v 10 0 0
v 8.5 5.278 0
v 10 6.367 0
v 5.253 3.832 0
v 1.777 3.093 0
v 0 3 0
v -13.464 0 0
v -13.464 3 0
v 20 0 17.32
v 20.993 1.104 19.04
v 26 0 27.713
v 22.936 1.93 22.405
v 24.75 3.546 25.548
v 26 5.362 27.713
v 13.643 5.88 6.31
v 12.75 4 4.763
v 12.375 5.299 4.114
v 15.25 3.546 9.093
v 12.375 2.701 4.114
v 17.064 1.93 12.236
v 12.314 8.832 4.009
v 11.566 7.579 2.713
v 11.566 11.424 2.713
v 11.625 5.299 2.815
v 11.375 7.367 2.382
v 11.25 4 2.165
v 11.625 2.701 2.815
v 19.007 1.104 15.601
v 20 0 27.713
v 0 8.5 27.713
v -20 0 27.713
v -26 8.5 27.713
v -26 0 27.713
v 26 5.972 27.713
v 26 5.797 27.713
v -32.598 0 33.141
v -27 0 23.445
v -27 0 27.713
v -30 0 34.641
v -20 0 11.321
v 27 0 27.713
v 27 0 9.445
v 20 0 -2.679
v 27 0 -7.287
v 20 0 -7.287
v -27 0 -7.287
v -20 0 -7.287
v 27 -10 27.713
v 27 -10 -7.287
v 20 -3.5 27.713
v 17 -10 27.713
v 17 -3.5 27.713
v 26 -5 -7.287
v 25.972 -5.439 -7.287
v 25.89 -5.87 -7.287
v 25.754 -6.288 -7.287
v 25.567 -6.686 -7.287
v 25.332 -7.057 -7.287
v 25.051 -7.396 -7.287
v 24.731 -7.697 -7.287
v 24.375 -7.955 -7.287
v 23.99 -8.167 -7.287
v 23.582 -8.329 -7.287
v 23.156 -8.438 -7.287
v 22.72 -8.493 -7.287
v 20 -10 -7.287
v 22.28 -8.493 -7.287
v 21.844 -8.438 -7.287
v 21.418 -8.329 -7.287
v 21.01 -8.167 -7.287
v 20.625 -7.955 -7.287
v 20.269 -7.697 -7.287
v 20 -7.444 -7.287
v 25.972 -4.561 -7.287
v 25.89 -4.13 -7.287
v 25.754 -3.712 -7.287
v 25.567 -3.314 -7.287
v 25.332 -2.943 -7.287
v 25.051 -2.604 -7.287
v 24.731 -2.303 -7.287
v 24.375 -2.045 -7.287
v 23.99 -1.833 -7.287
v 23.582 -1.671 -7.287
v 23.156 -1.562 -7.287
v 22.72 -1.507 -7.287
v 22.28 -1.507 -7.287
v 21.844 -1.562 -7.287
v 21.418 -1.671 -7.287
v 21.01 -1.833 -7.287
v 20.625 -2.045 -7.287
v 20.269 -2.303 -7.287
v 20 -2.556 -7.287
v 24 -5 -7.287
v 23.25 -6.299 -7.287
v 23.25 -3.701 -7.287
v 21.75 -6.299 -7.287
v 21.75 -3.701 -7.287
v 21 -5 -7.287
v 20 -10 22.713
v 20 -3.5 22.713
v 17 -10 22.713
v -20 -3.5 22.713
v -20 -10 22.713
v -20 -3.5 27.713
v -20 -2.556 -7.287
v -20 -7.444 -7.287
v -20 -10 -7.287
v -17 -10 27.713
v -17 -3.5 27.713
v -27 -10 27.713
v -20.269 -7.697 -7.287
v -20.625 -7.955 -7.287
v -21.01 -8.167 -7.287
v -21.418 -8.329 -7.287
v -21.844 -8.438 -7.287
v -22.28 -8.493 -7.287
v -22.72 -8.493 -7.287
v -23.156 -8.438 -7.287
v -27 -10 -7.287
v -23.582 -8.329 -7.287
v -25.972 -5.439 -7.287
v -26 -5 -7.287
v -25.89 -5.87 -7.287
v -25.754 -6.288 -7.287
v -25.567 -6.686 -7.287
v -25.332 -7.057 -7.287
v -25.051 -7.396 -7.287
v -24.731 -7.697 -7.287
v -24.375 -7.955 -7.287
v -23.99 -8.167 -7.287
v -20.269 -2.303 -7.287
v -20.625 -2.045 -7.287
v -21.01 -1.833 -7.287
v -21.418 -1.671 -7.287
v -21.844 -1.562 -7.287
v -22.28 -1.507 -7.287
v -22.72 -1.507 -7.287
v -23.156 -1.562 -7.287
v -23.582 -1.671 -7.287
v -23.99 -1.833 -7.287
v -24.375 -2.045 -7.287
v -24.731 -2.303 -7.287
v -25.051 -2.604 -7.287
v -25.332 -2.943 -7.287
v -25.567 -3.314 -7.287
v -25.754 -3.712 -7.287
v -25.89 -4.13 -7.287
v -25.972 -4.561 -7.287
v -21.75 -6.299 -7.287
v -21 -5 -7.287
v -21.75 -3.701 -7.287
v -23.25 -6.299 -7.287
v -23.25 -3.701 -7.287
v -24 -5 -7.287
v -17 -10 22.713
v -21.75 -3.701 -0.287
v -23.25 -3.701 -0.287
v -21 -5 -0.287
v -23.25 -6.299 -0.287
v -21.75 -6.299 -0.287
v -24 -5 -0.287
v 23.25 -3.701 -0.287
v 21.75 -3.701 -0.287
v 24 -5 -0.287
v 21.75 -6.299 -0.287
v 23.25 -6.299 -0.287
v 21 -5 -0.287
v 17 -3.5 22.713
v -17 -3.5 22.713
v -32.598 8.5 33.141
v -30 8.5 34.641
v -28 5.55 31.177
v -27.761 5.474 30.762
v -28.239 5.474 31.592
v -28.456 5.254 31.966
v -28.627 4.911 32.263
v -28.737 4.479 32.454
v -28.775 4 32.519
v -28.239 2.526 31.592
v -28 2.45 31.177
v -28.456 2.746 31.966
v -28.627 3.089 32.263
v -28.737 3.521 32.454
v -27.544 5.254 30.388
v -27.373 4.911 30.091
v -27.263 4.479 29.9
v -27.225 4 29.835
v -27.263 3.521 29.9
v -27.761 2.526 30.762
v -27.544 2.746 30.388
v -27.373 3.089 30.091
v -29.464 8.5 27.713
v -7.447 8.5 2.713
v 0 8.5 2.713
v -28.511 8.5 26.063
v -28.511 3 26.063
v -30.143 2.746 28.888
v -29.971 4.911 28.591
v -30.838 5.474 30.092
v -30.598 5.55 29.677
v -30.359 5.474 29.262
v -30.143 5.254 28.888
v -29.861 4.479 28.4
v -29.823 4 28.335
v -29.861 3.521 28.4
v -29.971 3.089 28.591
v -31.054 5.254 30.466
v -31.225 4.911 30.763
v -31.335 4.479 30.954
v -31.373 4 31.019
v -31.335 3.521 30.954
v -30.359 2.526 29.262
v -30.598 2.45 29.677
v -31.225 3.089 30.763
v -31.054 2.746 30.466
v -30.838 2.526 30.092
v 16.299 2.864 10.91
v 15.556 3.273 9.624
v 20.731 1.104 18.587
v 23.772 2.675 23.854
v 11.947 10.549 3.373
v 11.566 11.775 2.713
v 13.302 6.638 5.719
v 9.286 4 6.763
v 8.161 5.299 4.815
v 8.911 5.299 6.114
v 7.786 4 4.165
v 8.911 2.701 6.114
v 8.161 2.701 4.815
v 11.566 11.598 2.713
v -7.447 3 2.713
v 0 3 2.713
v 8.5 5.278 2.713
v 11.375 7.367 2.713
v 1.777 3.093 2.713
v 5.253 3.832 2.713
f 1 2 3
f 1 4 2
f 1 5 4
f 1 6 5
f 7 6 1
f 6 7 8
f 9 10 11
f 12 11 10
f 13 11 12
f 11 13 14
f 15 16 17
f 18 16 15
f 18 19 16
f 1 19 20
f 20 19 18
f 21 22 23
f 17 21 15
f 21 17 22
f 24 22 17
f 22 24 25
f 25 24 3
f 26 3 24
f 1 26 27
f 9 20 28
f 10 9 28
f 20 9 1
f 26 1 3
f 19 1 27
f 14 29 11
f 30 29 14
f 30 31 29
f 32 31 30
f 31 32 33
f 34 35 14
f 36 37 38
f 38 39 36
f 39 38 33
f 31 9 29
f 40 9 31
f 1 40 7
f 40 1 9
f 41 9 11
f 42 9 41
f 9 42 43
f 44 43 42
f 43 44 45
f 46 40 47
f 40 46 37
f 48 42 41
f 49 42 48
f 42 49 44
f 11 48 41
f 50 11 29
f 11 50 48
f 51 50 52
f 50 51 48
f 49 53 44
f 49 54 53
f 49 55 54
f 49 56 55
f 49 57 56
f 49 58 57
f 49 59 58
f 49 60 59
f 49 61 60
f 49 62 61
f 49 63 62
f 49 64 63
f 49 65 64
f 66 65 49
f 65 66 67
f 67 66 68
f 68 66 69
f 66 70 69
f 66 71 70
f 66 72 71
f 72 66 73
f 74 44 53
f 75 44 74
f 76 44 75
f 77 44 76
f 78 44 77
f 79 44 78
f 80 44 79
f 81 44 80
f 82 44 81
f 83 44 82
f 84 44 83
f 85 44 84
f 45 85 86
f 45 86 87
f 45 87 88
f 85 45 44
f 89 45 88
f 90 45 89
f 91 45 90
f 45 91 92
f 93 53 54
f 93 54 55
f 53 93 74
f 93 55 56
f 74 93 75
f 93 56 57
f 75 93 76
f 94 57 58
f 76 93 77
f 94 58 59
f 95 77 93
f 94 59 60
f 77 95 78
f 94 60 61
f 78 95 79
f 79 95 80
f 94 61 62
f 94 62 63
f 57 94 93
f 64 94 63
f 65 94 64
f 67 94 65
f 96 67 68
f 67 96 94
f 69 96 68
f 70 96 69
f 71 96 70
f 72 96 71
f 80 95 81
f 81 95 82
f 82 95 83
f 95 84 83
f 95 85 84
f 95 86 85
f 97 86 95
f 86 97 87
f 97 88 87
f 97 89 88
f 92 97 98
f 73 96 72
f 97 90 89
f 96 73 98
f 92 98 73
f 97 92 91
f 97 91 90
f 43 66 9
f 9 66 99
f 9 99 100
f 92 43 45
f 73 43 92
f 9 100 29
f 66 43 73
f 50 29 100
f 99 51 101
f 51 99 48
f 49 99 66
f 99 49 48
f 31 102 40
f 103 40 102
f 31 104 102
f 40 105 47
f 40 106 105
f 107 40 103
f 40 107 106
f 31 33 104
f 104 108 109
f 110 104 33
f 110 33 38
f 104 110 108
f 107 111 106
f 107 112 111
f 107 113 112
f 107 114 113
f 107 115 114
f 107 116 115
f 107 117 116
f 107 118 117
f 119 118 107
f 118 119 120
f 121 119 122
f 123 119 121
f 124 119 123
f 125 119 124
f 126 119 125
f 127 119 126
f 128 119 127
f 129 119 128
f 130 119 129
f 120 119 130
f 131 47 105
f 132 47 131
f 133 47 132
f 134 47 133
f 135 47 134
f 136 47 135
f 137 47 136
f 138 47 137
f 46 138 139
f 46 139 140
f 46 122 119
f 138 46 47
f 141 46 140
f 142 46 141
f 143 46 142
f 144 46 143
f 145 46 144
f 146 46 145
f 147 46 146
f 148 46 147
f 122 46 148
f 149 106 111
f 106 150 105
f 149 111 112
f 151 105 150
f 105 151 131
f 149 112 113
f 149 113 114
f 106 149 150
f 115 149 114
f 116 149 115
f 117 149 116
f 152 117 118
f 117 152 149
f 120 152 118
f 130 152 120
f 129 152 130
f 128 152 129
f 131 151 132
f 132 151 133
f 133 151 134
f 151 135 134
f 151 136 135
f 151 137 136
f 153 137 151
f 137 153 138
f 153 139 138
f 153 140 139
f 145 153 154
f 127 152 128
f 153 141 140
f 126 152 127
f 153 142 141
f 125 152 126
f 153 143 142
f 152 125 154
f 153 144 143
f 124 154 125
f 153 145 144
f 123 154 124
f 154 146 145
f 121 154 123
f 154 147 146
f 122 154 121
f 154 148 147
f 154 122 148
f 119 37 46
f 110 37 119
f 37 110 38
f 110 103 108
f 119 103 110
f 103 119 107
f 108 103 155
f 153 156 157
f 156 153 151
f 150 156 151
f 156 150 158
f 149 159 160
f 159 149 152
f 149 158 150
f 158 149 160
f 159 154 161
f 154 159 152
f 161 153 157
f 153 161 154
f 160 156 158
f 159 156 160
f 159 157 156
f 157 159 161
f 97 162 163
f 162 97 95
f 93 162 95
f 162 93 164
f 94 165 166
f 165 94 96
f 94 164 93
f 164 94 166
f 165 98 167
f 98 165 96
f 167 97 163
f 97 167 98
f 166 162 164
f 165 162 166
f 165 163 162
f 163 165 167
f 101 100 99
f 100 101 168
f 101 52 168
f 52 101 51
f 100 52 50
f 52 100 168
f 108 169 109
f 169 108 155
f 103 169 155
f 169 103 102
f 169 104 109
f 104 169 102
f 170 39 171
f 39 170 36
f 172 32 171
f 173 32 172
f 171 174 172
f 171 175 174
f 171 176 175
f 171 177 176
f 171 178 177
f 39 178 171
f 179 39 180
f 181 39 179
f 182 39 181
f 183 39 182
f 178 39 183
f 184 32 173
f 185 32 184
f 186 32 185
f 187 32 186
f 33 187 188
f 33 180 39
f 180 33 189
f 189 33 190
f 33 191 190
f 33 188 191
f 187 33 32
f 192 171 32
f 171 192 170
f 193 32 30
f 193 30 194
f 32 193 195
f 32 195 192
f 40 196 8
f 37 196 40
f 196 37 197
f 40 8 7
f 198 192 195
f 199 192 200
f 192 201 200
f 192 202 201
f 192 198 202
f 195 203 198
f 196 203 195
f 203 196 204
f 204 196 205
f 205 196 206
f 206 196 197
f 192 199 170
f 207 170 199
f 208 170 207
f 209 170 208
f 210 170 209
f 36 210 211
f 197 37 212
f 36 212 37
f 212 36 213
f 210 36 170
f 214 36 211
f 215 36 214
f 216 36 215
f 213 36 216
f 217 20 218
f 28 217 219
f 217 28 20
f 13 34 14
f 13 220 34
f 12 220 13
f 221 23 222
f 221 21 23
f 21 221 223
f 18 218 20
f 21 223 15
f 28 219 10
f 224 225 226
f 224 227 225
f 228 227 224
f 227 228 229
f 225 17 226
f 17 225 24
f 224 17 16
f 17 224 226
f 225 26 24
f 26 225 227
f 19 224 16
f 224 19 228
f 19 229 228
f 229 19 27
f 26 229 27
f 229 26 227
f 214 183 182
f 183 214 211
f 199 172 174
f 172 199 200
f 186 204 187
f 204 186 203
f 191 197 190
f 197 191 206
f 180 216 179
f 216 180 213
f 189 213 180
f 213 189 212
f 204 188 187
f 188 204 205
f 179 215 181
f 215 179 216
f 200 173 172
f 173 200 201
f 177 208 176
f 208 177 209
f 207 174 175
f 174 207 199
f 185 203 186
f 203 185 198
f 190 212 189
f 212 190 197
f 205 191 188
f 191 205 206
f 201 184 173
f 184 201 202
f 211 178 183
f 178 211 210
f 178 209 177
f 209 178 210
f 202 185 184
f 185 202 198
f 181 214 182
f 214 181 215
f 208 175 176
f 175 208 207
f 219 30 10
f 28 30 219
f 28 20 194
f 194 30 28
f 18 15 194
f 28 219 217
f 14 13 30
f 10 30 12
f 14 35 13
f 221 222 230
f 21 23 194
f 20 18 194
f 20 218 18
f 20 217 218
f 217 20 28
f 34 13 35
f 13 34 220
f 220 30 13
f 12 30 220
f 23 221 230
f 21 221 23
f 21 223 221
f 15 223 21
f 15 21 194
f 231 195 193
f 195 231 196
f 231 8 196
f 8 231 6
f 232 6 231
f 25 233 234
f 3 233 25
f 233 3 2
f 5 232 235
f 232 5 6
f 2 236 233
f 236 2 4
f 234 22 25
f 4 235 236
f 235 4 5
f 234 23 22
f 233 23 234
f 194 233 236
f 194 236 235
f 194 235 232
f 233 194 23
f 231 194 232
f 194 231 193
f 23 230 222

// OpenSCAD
fan_degree = 30;
fan_size = 40;
cube_x = 60;
cube_y = 40;

nozzle_height = 6; //3-1;
screw_y_offset = 5.0;

m_c = 9-1;
m_beta = fan_degree;
m_alpha=180-90-m_beta;
m_a = cos(m_beta)*m_c;
m_b = sin(m_beta)*m_c;

a();
//a(false);
//b();

module b() {
    translate([0, 0, -(40-(cos(m_beta)*fan_size-m_a))]) {
        air_nozzle();
    }
}

module a(left=true) {
    if(left) {
        a_half(true);
    } else {
        mirror([0, 1]) a_half();
    }
}

module a_half(cable_void) {
    difference () {
        union() {
            //rotate_fan() cube([1, cube_y, fan_size]);
            mirror([1, 0, 0]) rotate_fan() cube([3, 8.5, fan_size]);
            infill();
            fan_mount();
        }
        translate([0, (cube_y-fan_size)/2]) {
            rotate_fan() translate([1, 0]) mirror([1, 0]) 40mm_fan_void();
            mirror([1, 0, 0]) rotate_fan() mount_screw_void();
            air_void();
        }
        
        if(cable_void) {
            mirror([1, 0]) hull() {
                translate([5, 3]) cube([15, (fan_size-25)/2, 0.00000001]);
                translate([30, 3, cos(m_beta)*fan_size-m_a]) cube([15, (fan_size-25)/2, 0.0000001]);
            }
        }
        
        // cut bottom
        d = cube_y-3*2;
        h = (cos(m_beta)*fan_size-m_a)-25;
        translate([0, cube_y/2]) hull() {
            cylinder(d = d, h = h);
            translate([-d, -d/2, -99]) cube([d, d, h+99]);
        }
        translate([0, cube_y/2, -h]) hull() {
            cylinder(d = d+20, h = h);
        }
    }
}


module fan_mount() {
    difference() {
        translate([-fan_size/2, 0, -(40-(cos(m_beta)*fan_size-m_a))]) {
            40mm_blower_fan_mount();
        }
        rotate_fan() translate([0, 0]) cube([10, cube_y, fan_size]);
        //mirror([1, 0, 0]) rotate_fan() translate([1, 0]) cube([99, cube_y, fan_size]);
    }
}

module rotate_fan() {
    translate([cube_x/2-cos(m_alpha)*fan_size, 0, 0]) rotate([0, fan_degree, 0])
    children();
    //translate([0, 5, cos(m_beta)*fan_size-m_a]) cube([cube_x/2, fan_size, 20]);
}

module infill() {
    side();
    side(h=cube_y/2);
}

module side(h=1) {
    translate([0, h, 0]) rotate([90, 0, 0]) linear_extrude(height=h)
        polygon(points=[
            [-(cube_x/2-cos(m_alpha)*fan_size), 0],
            [-(cube_x/2-m_b), cos(m_beta)*fan_size-m_a],
            [cube_x/2-m_b, cos(m_beta)*fan_size-m_a],
            [cube_x/2-cos(m_alpha)*fan_size, 0]
        ]);
}

module air_void() {
    hull() {
        translate([cube_x/2-cos(m_alpha)*fan_size, 0, 0]) rotate([0, fan_degree, 0]) {
            translate([0, fan_size/2, fan_size/2]) rotate([0, 90, 0])
                mirror([0, 0, 1]) cylinder(h=0.0000000001, d=fan_size-1*2);
        }
        translate([0, (fan_size-23)/2, (cos(m_beta)*fan_size-m_a)-25]) cube([0.00000001, 23, 25]);
    }
    translate([-100, (fan_size-23)/2, 0]) cube([100, 23, (cos(m_beta)*fan_size-m_a)]);
    
    
}

module 40mm_fan_void() {
    screw = (fan_size-32)/2;
    screw_depth = 5;
    translate([0, fan_size/2, fan_size/2]) rotate([0, 90, 0]) cylinder(h=1, d=fan_size-1*2);
    
    translate([0, screw, screw]) rotate([0, 90, 0]) cylinder(h=screw_depth, d=3, $fn=6);
    translate([0, fan_size-screw, screw]) rotate([0, 90, 0]) cylinder(h=screw_depth, d=3, $fn=6);
    translate([0, screw, fan_size-screw]) rotate([0, 90, 0]) cylinder(h=screw_depth, d=3, $fn=6);
    translate([0, fan_size-screw, fan_size-screw]) rotate([0, 90, 0]) cylinder(h=screw_depth, d=3, $fn=6);
}

module mount_screw_void() {
    screw = (fan_size-32)/2;
    screw_depth = 3;
    $fn = 20;
    d = 3.1;
    translate([0, screw, fan_size-screw]) rotate([0, 90, 0]) cylinder(h=screw_depth, d=d);
    translate([0, fan_size-screw, fan_size-screw]) rotate([0, 90, 0]) cylinder(h=screw_depth, d=d);
}

module 40mm_blower_fan_mount() {
    screw = (fan_size-35)/2;
    base_thickness = 0;

    translate([0, 0, screw_y_offset]) cube([fan_size, base_thickness, fan_size-screw_y_offset]);
    /*
    translate([screw, 0, screw]) rotate([90, 0]) cylinder(h=1, d=2);
    translate([fan_size-screw, 0, screw]) rotate([90, 0]) cylinder(h=1, d=2);
    translate([screw, 0, fan_size-screw]) rotate([90, 0]) cylinder(h=1, d=2);
    translate([fan_size-screw, 0, fan_size-screw]) rotate([90, 0]) cylinder(h=1, d=2);
    */

    h = fan_size-screw_y_offset;
    translate([fan_size-3, -10, fan_size-screw_y_offset]) cube([3, 10-3.5, screw_y_offset]);
    translate([0, -10, fan_size-screw_y_offset]) cube([3, 10-3.5, screw_y_offset]);
    difference() {
        thickness = 7;
        translate([0, -10, screw_y_offset]) {
            translate([fan_size, 0, 0]) cube([thickness, 10+base_thickness, h]);
            //translate([fan_size-4, -3, screw_y_offset]) cube([4+thickness, 3, 6]);
            
            translate([-thickness, 0, 0]) cube([thickness, 10+base_thickness, h]);
            //translate([-thickness, -3, screw_y_offset]) cube([4+thickness, 3, 6]);
        }
        /*translate([0, (-10)/2, fan_size-screw_y_offset]) {
            translate([-3/2-bottom_thickness, 0]) m3_screw();
            translate([fan_size+3/2+bottom_thickness, 0]) m3_screw();
        }*/
        translate([0, (-10)/2, screw_y_offset]) rotate([180, 0]) {
            translate([-3/2-1, 0]) m3_screw();
            translate([fan_size+3/2+1, 0]) m3_screw();
        }
    }
}

module m3_screw(x) {
    if(x) {
        translate([0, 0, -7]) cylinder(h=7, d=3.1, $fn=20);
    } else {
        translate([0, 0, -7]) cylinder(h=7, d=3, $fn=6);
    }
    cylinder(h=99, d=7, $fn=50);
}

module air_nozzle() {
    length = 10;
    thickness=7;
    min_thickness=3;
    width1 = 28;
    width2 = 10;
    bottom_thickness=0.3;
    
    difference() {
        body();
        
        mount_hole();
        mirror([1, 0]) mount_hole();
    }
    //nozzle();
    
    module nozzle() translate([0, 0, -nozzle_height]) difference() {
        t = 1;
        d = 1;
        union() {
            hull() {
                translate([-width1/2-t, 0]) cube([width1+2*t, 0.0000001, 2+t]);
                translate([-width1/2, 1]) cube([width1, 0.0000001, 2+t]);
                translate([-width2/2-t, length-2]) cube([width2+2*t, 0.0000001, 2+t]);
            }
            hull() {
                translate([-width2/2-t, length-2]) cube([width2+2*t, 0.0000001, 2+t]);
                translate([-width2/2-t, length, -d]) cube([width2+2*t, 0.0000001, 2+t]);
            }
        }

        translate([0, 0, bottom_thickness]) {
            hull() {
                translate([-width1/2, 0]) cube([width1, 0.0000001, 2-bottom_thickness]);
                translate([-width2/2, length-2]) cube([width2, 0.0000001, 2-bottom_thickness]);
            }
            hull() {
                translate([-width2/2, length-2, -bottom_thickness]) cube([width2, 0.0000001, 2]);
                translate([-width2/2, length, -d]) cube([width2, 0.0000001, 2-bottom_thickness]);
            }
        }
        
        translate([-99/2, -99/2, -99]) cube(99);
    }
        
    module body() {
        translate([-fan_size/2, 0]) difference() {
            union() {
                translate([0, -10-1, -nozzle_height]) cube([fan_size, 10+1*2, nozzle_height+screw_y_offset]);
            }
            translate([0, -10, 0]) cube([fan_size, 10, screw_y_offset]);

            translate([(fan_size-28)/2, -10, 0]) {
                translate([0, nozzle_height-bottom_thickness, -nozzle_height+bottom_thickness])
                    cube([28, 10-(nozzle_height-bottom_thickness), nozzle_height-bottom_thickness]);
                translate([0, 10, -nozzle_height])
                    cube([28, 1, 2]);
                translate([0, nozzle_height-bottom_thickness]) intersection() {
                    translate([0, -nozzle_height+bottom_thickness, -nozzle_height+bottom_thickness]) cube([28, 10, nozzle_height-bottom_thickness]);
                    rotate([0, 90]) cylinder(r=nozzle_height-bottom_thickness, h=28, $fn=30);
                }
            }
        }
    
        mount();
        mirror([1, 0]) mount();
    }
    
    module mount() {
        translate([-fan_size/2-thickness, -10-1, -nozzle_height]) cube([thickness, 10+2, screw_y_offset+nozzle_height]);
        translate([-fan_size/2, -10, 0]) cube([3, 10-3.5, screw_y_offset]);
   }
        
    module mount_hole() difference() {
        translate([-fan_size/2, (-10)/2, screw_y_offset-2]) rotate([180, 0]) {
            translate([-3/2-1, 0]) m3_screw(true);
        }
    }
    module p() polygon([[-28/2, 0], [-5, length], [5, length], [28/2, 0]]);
}
